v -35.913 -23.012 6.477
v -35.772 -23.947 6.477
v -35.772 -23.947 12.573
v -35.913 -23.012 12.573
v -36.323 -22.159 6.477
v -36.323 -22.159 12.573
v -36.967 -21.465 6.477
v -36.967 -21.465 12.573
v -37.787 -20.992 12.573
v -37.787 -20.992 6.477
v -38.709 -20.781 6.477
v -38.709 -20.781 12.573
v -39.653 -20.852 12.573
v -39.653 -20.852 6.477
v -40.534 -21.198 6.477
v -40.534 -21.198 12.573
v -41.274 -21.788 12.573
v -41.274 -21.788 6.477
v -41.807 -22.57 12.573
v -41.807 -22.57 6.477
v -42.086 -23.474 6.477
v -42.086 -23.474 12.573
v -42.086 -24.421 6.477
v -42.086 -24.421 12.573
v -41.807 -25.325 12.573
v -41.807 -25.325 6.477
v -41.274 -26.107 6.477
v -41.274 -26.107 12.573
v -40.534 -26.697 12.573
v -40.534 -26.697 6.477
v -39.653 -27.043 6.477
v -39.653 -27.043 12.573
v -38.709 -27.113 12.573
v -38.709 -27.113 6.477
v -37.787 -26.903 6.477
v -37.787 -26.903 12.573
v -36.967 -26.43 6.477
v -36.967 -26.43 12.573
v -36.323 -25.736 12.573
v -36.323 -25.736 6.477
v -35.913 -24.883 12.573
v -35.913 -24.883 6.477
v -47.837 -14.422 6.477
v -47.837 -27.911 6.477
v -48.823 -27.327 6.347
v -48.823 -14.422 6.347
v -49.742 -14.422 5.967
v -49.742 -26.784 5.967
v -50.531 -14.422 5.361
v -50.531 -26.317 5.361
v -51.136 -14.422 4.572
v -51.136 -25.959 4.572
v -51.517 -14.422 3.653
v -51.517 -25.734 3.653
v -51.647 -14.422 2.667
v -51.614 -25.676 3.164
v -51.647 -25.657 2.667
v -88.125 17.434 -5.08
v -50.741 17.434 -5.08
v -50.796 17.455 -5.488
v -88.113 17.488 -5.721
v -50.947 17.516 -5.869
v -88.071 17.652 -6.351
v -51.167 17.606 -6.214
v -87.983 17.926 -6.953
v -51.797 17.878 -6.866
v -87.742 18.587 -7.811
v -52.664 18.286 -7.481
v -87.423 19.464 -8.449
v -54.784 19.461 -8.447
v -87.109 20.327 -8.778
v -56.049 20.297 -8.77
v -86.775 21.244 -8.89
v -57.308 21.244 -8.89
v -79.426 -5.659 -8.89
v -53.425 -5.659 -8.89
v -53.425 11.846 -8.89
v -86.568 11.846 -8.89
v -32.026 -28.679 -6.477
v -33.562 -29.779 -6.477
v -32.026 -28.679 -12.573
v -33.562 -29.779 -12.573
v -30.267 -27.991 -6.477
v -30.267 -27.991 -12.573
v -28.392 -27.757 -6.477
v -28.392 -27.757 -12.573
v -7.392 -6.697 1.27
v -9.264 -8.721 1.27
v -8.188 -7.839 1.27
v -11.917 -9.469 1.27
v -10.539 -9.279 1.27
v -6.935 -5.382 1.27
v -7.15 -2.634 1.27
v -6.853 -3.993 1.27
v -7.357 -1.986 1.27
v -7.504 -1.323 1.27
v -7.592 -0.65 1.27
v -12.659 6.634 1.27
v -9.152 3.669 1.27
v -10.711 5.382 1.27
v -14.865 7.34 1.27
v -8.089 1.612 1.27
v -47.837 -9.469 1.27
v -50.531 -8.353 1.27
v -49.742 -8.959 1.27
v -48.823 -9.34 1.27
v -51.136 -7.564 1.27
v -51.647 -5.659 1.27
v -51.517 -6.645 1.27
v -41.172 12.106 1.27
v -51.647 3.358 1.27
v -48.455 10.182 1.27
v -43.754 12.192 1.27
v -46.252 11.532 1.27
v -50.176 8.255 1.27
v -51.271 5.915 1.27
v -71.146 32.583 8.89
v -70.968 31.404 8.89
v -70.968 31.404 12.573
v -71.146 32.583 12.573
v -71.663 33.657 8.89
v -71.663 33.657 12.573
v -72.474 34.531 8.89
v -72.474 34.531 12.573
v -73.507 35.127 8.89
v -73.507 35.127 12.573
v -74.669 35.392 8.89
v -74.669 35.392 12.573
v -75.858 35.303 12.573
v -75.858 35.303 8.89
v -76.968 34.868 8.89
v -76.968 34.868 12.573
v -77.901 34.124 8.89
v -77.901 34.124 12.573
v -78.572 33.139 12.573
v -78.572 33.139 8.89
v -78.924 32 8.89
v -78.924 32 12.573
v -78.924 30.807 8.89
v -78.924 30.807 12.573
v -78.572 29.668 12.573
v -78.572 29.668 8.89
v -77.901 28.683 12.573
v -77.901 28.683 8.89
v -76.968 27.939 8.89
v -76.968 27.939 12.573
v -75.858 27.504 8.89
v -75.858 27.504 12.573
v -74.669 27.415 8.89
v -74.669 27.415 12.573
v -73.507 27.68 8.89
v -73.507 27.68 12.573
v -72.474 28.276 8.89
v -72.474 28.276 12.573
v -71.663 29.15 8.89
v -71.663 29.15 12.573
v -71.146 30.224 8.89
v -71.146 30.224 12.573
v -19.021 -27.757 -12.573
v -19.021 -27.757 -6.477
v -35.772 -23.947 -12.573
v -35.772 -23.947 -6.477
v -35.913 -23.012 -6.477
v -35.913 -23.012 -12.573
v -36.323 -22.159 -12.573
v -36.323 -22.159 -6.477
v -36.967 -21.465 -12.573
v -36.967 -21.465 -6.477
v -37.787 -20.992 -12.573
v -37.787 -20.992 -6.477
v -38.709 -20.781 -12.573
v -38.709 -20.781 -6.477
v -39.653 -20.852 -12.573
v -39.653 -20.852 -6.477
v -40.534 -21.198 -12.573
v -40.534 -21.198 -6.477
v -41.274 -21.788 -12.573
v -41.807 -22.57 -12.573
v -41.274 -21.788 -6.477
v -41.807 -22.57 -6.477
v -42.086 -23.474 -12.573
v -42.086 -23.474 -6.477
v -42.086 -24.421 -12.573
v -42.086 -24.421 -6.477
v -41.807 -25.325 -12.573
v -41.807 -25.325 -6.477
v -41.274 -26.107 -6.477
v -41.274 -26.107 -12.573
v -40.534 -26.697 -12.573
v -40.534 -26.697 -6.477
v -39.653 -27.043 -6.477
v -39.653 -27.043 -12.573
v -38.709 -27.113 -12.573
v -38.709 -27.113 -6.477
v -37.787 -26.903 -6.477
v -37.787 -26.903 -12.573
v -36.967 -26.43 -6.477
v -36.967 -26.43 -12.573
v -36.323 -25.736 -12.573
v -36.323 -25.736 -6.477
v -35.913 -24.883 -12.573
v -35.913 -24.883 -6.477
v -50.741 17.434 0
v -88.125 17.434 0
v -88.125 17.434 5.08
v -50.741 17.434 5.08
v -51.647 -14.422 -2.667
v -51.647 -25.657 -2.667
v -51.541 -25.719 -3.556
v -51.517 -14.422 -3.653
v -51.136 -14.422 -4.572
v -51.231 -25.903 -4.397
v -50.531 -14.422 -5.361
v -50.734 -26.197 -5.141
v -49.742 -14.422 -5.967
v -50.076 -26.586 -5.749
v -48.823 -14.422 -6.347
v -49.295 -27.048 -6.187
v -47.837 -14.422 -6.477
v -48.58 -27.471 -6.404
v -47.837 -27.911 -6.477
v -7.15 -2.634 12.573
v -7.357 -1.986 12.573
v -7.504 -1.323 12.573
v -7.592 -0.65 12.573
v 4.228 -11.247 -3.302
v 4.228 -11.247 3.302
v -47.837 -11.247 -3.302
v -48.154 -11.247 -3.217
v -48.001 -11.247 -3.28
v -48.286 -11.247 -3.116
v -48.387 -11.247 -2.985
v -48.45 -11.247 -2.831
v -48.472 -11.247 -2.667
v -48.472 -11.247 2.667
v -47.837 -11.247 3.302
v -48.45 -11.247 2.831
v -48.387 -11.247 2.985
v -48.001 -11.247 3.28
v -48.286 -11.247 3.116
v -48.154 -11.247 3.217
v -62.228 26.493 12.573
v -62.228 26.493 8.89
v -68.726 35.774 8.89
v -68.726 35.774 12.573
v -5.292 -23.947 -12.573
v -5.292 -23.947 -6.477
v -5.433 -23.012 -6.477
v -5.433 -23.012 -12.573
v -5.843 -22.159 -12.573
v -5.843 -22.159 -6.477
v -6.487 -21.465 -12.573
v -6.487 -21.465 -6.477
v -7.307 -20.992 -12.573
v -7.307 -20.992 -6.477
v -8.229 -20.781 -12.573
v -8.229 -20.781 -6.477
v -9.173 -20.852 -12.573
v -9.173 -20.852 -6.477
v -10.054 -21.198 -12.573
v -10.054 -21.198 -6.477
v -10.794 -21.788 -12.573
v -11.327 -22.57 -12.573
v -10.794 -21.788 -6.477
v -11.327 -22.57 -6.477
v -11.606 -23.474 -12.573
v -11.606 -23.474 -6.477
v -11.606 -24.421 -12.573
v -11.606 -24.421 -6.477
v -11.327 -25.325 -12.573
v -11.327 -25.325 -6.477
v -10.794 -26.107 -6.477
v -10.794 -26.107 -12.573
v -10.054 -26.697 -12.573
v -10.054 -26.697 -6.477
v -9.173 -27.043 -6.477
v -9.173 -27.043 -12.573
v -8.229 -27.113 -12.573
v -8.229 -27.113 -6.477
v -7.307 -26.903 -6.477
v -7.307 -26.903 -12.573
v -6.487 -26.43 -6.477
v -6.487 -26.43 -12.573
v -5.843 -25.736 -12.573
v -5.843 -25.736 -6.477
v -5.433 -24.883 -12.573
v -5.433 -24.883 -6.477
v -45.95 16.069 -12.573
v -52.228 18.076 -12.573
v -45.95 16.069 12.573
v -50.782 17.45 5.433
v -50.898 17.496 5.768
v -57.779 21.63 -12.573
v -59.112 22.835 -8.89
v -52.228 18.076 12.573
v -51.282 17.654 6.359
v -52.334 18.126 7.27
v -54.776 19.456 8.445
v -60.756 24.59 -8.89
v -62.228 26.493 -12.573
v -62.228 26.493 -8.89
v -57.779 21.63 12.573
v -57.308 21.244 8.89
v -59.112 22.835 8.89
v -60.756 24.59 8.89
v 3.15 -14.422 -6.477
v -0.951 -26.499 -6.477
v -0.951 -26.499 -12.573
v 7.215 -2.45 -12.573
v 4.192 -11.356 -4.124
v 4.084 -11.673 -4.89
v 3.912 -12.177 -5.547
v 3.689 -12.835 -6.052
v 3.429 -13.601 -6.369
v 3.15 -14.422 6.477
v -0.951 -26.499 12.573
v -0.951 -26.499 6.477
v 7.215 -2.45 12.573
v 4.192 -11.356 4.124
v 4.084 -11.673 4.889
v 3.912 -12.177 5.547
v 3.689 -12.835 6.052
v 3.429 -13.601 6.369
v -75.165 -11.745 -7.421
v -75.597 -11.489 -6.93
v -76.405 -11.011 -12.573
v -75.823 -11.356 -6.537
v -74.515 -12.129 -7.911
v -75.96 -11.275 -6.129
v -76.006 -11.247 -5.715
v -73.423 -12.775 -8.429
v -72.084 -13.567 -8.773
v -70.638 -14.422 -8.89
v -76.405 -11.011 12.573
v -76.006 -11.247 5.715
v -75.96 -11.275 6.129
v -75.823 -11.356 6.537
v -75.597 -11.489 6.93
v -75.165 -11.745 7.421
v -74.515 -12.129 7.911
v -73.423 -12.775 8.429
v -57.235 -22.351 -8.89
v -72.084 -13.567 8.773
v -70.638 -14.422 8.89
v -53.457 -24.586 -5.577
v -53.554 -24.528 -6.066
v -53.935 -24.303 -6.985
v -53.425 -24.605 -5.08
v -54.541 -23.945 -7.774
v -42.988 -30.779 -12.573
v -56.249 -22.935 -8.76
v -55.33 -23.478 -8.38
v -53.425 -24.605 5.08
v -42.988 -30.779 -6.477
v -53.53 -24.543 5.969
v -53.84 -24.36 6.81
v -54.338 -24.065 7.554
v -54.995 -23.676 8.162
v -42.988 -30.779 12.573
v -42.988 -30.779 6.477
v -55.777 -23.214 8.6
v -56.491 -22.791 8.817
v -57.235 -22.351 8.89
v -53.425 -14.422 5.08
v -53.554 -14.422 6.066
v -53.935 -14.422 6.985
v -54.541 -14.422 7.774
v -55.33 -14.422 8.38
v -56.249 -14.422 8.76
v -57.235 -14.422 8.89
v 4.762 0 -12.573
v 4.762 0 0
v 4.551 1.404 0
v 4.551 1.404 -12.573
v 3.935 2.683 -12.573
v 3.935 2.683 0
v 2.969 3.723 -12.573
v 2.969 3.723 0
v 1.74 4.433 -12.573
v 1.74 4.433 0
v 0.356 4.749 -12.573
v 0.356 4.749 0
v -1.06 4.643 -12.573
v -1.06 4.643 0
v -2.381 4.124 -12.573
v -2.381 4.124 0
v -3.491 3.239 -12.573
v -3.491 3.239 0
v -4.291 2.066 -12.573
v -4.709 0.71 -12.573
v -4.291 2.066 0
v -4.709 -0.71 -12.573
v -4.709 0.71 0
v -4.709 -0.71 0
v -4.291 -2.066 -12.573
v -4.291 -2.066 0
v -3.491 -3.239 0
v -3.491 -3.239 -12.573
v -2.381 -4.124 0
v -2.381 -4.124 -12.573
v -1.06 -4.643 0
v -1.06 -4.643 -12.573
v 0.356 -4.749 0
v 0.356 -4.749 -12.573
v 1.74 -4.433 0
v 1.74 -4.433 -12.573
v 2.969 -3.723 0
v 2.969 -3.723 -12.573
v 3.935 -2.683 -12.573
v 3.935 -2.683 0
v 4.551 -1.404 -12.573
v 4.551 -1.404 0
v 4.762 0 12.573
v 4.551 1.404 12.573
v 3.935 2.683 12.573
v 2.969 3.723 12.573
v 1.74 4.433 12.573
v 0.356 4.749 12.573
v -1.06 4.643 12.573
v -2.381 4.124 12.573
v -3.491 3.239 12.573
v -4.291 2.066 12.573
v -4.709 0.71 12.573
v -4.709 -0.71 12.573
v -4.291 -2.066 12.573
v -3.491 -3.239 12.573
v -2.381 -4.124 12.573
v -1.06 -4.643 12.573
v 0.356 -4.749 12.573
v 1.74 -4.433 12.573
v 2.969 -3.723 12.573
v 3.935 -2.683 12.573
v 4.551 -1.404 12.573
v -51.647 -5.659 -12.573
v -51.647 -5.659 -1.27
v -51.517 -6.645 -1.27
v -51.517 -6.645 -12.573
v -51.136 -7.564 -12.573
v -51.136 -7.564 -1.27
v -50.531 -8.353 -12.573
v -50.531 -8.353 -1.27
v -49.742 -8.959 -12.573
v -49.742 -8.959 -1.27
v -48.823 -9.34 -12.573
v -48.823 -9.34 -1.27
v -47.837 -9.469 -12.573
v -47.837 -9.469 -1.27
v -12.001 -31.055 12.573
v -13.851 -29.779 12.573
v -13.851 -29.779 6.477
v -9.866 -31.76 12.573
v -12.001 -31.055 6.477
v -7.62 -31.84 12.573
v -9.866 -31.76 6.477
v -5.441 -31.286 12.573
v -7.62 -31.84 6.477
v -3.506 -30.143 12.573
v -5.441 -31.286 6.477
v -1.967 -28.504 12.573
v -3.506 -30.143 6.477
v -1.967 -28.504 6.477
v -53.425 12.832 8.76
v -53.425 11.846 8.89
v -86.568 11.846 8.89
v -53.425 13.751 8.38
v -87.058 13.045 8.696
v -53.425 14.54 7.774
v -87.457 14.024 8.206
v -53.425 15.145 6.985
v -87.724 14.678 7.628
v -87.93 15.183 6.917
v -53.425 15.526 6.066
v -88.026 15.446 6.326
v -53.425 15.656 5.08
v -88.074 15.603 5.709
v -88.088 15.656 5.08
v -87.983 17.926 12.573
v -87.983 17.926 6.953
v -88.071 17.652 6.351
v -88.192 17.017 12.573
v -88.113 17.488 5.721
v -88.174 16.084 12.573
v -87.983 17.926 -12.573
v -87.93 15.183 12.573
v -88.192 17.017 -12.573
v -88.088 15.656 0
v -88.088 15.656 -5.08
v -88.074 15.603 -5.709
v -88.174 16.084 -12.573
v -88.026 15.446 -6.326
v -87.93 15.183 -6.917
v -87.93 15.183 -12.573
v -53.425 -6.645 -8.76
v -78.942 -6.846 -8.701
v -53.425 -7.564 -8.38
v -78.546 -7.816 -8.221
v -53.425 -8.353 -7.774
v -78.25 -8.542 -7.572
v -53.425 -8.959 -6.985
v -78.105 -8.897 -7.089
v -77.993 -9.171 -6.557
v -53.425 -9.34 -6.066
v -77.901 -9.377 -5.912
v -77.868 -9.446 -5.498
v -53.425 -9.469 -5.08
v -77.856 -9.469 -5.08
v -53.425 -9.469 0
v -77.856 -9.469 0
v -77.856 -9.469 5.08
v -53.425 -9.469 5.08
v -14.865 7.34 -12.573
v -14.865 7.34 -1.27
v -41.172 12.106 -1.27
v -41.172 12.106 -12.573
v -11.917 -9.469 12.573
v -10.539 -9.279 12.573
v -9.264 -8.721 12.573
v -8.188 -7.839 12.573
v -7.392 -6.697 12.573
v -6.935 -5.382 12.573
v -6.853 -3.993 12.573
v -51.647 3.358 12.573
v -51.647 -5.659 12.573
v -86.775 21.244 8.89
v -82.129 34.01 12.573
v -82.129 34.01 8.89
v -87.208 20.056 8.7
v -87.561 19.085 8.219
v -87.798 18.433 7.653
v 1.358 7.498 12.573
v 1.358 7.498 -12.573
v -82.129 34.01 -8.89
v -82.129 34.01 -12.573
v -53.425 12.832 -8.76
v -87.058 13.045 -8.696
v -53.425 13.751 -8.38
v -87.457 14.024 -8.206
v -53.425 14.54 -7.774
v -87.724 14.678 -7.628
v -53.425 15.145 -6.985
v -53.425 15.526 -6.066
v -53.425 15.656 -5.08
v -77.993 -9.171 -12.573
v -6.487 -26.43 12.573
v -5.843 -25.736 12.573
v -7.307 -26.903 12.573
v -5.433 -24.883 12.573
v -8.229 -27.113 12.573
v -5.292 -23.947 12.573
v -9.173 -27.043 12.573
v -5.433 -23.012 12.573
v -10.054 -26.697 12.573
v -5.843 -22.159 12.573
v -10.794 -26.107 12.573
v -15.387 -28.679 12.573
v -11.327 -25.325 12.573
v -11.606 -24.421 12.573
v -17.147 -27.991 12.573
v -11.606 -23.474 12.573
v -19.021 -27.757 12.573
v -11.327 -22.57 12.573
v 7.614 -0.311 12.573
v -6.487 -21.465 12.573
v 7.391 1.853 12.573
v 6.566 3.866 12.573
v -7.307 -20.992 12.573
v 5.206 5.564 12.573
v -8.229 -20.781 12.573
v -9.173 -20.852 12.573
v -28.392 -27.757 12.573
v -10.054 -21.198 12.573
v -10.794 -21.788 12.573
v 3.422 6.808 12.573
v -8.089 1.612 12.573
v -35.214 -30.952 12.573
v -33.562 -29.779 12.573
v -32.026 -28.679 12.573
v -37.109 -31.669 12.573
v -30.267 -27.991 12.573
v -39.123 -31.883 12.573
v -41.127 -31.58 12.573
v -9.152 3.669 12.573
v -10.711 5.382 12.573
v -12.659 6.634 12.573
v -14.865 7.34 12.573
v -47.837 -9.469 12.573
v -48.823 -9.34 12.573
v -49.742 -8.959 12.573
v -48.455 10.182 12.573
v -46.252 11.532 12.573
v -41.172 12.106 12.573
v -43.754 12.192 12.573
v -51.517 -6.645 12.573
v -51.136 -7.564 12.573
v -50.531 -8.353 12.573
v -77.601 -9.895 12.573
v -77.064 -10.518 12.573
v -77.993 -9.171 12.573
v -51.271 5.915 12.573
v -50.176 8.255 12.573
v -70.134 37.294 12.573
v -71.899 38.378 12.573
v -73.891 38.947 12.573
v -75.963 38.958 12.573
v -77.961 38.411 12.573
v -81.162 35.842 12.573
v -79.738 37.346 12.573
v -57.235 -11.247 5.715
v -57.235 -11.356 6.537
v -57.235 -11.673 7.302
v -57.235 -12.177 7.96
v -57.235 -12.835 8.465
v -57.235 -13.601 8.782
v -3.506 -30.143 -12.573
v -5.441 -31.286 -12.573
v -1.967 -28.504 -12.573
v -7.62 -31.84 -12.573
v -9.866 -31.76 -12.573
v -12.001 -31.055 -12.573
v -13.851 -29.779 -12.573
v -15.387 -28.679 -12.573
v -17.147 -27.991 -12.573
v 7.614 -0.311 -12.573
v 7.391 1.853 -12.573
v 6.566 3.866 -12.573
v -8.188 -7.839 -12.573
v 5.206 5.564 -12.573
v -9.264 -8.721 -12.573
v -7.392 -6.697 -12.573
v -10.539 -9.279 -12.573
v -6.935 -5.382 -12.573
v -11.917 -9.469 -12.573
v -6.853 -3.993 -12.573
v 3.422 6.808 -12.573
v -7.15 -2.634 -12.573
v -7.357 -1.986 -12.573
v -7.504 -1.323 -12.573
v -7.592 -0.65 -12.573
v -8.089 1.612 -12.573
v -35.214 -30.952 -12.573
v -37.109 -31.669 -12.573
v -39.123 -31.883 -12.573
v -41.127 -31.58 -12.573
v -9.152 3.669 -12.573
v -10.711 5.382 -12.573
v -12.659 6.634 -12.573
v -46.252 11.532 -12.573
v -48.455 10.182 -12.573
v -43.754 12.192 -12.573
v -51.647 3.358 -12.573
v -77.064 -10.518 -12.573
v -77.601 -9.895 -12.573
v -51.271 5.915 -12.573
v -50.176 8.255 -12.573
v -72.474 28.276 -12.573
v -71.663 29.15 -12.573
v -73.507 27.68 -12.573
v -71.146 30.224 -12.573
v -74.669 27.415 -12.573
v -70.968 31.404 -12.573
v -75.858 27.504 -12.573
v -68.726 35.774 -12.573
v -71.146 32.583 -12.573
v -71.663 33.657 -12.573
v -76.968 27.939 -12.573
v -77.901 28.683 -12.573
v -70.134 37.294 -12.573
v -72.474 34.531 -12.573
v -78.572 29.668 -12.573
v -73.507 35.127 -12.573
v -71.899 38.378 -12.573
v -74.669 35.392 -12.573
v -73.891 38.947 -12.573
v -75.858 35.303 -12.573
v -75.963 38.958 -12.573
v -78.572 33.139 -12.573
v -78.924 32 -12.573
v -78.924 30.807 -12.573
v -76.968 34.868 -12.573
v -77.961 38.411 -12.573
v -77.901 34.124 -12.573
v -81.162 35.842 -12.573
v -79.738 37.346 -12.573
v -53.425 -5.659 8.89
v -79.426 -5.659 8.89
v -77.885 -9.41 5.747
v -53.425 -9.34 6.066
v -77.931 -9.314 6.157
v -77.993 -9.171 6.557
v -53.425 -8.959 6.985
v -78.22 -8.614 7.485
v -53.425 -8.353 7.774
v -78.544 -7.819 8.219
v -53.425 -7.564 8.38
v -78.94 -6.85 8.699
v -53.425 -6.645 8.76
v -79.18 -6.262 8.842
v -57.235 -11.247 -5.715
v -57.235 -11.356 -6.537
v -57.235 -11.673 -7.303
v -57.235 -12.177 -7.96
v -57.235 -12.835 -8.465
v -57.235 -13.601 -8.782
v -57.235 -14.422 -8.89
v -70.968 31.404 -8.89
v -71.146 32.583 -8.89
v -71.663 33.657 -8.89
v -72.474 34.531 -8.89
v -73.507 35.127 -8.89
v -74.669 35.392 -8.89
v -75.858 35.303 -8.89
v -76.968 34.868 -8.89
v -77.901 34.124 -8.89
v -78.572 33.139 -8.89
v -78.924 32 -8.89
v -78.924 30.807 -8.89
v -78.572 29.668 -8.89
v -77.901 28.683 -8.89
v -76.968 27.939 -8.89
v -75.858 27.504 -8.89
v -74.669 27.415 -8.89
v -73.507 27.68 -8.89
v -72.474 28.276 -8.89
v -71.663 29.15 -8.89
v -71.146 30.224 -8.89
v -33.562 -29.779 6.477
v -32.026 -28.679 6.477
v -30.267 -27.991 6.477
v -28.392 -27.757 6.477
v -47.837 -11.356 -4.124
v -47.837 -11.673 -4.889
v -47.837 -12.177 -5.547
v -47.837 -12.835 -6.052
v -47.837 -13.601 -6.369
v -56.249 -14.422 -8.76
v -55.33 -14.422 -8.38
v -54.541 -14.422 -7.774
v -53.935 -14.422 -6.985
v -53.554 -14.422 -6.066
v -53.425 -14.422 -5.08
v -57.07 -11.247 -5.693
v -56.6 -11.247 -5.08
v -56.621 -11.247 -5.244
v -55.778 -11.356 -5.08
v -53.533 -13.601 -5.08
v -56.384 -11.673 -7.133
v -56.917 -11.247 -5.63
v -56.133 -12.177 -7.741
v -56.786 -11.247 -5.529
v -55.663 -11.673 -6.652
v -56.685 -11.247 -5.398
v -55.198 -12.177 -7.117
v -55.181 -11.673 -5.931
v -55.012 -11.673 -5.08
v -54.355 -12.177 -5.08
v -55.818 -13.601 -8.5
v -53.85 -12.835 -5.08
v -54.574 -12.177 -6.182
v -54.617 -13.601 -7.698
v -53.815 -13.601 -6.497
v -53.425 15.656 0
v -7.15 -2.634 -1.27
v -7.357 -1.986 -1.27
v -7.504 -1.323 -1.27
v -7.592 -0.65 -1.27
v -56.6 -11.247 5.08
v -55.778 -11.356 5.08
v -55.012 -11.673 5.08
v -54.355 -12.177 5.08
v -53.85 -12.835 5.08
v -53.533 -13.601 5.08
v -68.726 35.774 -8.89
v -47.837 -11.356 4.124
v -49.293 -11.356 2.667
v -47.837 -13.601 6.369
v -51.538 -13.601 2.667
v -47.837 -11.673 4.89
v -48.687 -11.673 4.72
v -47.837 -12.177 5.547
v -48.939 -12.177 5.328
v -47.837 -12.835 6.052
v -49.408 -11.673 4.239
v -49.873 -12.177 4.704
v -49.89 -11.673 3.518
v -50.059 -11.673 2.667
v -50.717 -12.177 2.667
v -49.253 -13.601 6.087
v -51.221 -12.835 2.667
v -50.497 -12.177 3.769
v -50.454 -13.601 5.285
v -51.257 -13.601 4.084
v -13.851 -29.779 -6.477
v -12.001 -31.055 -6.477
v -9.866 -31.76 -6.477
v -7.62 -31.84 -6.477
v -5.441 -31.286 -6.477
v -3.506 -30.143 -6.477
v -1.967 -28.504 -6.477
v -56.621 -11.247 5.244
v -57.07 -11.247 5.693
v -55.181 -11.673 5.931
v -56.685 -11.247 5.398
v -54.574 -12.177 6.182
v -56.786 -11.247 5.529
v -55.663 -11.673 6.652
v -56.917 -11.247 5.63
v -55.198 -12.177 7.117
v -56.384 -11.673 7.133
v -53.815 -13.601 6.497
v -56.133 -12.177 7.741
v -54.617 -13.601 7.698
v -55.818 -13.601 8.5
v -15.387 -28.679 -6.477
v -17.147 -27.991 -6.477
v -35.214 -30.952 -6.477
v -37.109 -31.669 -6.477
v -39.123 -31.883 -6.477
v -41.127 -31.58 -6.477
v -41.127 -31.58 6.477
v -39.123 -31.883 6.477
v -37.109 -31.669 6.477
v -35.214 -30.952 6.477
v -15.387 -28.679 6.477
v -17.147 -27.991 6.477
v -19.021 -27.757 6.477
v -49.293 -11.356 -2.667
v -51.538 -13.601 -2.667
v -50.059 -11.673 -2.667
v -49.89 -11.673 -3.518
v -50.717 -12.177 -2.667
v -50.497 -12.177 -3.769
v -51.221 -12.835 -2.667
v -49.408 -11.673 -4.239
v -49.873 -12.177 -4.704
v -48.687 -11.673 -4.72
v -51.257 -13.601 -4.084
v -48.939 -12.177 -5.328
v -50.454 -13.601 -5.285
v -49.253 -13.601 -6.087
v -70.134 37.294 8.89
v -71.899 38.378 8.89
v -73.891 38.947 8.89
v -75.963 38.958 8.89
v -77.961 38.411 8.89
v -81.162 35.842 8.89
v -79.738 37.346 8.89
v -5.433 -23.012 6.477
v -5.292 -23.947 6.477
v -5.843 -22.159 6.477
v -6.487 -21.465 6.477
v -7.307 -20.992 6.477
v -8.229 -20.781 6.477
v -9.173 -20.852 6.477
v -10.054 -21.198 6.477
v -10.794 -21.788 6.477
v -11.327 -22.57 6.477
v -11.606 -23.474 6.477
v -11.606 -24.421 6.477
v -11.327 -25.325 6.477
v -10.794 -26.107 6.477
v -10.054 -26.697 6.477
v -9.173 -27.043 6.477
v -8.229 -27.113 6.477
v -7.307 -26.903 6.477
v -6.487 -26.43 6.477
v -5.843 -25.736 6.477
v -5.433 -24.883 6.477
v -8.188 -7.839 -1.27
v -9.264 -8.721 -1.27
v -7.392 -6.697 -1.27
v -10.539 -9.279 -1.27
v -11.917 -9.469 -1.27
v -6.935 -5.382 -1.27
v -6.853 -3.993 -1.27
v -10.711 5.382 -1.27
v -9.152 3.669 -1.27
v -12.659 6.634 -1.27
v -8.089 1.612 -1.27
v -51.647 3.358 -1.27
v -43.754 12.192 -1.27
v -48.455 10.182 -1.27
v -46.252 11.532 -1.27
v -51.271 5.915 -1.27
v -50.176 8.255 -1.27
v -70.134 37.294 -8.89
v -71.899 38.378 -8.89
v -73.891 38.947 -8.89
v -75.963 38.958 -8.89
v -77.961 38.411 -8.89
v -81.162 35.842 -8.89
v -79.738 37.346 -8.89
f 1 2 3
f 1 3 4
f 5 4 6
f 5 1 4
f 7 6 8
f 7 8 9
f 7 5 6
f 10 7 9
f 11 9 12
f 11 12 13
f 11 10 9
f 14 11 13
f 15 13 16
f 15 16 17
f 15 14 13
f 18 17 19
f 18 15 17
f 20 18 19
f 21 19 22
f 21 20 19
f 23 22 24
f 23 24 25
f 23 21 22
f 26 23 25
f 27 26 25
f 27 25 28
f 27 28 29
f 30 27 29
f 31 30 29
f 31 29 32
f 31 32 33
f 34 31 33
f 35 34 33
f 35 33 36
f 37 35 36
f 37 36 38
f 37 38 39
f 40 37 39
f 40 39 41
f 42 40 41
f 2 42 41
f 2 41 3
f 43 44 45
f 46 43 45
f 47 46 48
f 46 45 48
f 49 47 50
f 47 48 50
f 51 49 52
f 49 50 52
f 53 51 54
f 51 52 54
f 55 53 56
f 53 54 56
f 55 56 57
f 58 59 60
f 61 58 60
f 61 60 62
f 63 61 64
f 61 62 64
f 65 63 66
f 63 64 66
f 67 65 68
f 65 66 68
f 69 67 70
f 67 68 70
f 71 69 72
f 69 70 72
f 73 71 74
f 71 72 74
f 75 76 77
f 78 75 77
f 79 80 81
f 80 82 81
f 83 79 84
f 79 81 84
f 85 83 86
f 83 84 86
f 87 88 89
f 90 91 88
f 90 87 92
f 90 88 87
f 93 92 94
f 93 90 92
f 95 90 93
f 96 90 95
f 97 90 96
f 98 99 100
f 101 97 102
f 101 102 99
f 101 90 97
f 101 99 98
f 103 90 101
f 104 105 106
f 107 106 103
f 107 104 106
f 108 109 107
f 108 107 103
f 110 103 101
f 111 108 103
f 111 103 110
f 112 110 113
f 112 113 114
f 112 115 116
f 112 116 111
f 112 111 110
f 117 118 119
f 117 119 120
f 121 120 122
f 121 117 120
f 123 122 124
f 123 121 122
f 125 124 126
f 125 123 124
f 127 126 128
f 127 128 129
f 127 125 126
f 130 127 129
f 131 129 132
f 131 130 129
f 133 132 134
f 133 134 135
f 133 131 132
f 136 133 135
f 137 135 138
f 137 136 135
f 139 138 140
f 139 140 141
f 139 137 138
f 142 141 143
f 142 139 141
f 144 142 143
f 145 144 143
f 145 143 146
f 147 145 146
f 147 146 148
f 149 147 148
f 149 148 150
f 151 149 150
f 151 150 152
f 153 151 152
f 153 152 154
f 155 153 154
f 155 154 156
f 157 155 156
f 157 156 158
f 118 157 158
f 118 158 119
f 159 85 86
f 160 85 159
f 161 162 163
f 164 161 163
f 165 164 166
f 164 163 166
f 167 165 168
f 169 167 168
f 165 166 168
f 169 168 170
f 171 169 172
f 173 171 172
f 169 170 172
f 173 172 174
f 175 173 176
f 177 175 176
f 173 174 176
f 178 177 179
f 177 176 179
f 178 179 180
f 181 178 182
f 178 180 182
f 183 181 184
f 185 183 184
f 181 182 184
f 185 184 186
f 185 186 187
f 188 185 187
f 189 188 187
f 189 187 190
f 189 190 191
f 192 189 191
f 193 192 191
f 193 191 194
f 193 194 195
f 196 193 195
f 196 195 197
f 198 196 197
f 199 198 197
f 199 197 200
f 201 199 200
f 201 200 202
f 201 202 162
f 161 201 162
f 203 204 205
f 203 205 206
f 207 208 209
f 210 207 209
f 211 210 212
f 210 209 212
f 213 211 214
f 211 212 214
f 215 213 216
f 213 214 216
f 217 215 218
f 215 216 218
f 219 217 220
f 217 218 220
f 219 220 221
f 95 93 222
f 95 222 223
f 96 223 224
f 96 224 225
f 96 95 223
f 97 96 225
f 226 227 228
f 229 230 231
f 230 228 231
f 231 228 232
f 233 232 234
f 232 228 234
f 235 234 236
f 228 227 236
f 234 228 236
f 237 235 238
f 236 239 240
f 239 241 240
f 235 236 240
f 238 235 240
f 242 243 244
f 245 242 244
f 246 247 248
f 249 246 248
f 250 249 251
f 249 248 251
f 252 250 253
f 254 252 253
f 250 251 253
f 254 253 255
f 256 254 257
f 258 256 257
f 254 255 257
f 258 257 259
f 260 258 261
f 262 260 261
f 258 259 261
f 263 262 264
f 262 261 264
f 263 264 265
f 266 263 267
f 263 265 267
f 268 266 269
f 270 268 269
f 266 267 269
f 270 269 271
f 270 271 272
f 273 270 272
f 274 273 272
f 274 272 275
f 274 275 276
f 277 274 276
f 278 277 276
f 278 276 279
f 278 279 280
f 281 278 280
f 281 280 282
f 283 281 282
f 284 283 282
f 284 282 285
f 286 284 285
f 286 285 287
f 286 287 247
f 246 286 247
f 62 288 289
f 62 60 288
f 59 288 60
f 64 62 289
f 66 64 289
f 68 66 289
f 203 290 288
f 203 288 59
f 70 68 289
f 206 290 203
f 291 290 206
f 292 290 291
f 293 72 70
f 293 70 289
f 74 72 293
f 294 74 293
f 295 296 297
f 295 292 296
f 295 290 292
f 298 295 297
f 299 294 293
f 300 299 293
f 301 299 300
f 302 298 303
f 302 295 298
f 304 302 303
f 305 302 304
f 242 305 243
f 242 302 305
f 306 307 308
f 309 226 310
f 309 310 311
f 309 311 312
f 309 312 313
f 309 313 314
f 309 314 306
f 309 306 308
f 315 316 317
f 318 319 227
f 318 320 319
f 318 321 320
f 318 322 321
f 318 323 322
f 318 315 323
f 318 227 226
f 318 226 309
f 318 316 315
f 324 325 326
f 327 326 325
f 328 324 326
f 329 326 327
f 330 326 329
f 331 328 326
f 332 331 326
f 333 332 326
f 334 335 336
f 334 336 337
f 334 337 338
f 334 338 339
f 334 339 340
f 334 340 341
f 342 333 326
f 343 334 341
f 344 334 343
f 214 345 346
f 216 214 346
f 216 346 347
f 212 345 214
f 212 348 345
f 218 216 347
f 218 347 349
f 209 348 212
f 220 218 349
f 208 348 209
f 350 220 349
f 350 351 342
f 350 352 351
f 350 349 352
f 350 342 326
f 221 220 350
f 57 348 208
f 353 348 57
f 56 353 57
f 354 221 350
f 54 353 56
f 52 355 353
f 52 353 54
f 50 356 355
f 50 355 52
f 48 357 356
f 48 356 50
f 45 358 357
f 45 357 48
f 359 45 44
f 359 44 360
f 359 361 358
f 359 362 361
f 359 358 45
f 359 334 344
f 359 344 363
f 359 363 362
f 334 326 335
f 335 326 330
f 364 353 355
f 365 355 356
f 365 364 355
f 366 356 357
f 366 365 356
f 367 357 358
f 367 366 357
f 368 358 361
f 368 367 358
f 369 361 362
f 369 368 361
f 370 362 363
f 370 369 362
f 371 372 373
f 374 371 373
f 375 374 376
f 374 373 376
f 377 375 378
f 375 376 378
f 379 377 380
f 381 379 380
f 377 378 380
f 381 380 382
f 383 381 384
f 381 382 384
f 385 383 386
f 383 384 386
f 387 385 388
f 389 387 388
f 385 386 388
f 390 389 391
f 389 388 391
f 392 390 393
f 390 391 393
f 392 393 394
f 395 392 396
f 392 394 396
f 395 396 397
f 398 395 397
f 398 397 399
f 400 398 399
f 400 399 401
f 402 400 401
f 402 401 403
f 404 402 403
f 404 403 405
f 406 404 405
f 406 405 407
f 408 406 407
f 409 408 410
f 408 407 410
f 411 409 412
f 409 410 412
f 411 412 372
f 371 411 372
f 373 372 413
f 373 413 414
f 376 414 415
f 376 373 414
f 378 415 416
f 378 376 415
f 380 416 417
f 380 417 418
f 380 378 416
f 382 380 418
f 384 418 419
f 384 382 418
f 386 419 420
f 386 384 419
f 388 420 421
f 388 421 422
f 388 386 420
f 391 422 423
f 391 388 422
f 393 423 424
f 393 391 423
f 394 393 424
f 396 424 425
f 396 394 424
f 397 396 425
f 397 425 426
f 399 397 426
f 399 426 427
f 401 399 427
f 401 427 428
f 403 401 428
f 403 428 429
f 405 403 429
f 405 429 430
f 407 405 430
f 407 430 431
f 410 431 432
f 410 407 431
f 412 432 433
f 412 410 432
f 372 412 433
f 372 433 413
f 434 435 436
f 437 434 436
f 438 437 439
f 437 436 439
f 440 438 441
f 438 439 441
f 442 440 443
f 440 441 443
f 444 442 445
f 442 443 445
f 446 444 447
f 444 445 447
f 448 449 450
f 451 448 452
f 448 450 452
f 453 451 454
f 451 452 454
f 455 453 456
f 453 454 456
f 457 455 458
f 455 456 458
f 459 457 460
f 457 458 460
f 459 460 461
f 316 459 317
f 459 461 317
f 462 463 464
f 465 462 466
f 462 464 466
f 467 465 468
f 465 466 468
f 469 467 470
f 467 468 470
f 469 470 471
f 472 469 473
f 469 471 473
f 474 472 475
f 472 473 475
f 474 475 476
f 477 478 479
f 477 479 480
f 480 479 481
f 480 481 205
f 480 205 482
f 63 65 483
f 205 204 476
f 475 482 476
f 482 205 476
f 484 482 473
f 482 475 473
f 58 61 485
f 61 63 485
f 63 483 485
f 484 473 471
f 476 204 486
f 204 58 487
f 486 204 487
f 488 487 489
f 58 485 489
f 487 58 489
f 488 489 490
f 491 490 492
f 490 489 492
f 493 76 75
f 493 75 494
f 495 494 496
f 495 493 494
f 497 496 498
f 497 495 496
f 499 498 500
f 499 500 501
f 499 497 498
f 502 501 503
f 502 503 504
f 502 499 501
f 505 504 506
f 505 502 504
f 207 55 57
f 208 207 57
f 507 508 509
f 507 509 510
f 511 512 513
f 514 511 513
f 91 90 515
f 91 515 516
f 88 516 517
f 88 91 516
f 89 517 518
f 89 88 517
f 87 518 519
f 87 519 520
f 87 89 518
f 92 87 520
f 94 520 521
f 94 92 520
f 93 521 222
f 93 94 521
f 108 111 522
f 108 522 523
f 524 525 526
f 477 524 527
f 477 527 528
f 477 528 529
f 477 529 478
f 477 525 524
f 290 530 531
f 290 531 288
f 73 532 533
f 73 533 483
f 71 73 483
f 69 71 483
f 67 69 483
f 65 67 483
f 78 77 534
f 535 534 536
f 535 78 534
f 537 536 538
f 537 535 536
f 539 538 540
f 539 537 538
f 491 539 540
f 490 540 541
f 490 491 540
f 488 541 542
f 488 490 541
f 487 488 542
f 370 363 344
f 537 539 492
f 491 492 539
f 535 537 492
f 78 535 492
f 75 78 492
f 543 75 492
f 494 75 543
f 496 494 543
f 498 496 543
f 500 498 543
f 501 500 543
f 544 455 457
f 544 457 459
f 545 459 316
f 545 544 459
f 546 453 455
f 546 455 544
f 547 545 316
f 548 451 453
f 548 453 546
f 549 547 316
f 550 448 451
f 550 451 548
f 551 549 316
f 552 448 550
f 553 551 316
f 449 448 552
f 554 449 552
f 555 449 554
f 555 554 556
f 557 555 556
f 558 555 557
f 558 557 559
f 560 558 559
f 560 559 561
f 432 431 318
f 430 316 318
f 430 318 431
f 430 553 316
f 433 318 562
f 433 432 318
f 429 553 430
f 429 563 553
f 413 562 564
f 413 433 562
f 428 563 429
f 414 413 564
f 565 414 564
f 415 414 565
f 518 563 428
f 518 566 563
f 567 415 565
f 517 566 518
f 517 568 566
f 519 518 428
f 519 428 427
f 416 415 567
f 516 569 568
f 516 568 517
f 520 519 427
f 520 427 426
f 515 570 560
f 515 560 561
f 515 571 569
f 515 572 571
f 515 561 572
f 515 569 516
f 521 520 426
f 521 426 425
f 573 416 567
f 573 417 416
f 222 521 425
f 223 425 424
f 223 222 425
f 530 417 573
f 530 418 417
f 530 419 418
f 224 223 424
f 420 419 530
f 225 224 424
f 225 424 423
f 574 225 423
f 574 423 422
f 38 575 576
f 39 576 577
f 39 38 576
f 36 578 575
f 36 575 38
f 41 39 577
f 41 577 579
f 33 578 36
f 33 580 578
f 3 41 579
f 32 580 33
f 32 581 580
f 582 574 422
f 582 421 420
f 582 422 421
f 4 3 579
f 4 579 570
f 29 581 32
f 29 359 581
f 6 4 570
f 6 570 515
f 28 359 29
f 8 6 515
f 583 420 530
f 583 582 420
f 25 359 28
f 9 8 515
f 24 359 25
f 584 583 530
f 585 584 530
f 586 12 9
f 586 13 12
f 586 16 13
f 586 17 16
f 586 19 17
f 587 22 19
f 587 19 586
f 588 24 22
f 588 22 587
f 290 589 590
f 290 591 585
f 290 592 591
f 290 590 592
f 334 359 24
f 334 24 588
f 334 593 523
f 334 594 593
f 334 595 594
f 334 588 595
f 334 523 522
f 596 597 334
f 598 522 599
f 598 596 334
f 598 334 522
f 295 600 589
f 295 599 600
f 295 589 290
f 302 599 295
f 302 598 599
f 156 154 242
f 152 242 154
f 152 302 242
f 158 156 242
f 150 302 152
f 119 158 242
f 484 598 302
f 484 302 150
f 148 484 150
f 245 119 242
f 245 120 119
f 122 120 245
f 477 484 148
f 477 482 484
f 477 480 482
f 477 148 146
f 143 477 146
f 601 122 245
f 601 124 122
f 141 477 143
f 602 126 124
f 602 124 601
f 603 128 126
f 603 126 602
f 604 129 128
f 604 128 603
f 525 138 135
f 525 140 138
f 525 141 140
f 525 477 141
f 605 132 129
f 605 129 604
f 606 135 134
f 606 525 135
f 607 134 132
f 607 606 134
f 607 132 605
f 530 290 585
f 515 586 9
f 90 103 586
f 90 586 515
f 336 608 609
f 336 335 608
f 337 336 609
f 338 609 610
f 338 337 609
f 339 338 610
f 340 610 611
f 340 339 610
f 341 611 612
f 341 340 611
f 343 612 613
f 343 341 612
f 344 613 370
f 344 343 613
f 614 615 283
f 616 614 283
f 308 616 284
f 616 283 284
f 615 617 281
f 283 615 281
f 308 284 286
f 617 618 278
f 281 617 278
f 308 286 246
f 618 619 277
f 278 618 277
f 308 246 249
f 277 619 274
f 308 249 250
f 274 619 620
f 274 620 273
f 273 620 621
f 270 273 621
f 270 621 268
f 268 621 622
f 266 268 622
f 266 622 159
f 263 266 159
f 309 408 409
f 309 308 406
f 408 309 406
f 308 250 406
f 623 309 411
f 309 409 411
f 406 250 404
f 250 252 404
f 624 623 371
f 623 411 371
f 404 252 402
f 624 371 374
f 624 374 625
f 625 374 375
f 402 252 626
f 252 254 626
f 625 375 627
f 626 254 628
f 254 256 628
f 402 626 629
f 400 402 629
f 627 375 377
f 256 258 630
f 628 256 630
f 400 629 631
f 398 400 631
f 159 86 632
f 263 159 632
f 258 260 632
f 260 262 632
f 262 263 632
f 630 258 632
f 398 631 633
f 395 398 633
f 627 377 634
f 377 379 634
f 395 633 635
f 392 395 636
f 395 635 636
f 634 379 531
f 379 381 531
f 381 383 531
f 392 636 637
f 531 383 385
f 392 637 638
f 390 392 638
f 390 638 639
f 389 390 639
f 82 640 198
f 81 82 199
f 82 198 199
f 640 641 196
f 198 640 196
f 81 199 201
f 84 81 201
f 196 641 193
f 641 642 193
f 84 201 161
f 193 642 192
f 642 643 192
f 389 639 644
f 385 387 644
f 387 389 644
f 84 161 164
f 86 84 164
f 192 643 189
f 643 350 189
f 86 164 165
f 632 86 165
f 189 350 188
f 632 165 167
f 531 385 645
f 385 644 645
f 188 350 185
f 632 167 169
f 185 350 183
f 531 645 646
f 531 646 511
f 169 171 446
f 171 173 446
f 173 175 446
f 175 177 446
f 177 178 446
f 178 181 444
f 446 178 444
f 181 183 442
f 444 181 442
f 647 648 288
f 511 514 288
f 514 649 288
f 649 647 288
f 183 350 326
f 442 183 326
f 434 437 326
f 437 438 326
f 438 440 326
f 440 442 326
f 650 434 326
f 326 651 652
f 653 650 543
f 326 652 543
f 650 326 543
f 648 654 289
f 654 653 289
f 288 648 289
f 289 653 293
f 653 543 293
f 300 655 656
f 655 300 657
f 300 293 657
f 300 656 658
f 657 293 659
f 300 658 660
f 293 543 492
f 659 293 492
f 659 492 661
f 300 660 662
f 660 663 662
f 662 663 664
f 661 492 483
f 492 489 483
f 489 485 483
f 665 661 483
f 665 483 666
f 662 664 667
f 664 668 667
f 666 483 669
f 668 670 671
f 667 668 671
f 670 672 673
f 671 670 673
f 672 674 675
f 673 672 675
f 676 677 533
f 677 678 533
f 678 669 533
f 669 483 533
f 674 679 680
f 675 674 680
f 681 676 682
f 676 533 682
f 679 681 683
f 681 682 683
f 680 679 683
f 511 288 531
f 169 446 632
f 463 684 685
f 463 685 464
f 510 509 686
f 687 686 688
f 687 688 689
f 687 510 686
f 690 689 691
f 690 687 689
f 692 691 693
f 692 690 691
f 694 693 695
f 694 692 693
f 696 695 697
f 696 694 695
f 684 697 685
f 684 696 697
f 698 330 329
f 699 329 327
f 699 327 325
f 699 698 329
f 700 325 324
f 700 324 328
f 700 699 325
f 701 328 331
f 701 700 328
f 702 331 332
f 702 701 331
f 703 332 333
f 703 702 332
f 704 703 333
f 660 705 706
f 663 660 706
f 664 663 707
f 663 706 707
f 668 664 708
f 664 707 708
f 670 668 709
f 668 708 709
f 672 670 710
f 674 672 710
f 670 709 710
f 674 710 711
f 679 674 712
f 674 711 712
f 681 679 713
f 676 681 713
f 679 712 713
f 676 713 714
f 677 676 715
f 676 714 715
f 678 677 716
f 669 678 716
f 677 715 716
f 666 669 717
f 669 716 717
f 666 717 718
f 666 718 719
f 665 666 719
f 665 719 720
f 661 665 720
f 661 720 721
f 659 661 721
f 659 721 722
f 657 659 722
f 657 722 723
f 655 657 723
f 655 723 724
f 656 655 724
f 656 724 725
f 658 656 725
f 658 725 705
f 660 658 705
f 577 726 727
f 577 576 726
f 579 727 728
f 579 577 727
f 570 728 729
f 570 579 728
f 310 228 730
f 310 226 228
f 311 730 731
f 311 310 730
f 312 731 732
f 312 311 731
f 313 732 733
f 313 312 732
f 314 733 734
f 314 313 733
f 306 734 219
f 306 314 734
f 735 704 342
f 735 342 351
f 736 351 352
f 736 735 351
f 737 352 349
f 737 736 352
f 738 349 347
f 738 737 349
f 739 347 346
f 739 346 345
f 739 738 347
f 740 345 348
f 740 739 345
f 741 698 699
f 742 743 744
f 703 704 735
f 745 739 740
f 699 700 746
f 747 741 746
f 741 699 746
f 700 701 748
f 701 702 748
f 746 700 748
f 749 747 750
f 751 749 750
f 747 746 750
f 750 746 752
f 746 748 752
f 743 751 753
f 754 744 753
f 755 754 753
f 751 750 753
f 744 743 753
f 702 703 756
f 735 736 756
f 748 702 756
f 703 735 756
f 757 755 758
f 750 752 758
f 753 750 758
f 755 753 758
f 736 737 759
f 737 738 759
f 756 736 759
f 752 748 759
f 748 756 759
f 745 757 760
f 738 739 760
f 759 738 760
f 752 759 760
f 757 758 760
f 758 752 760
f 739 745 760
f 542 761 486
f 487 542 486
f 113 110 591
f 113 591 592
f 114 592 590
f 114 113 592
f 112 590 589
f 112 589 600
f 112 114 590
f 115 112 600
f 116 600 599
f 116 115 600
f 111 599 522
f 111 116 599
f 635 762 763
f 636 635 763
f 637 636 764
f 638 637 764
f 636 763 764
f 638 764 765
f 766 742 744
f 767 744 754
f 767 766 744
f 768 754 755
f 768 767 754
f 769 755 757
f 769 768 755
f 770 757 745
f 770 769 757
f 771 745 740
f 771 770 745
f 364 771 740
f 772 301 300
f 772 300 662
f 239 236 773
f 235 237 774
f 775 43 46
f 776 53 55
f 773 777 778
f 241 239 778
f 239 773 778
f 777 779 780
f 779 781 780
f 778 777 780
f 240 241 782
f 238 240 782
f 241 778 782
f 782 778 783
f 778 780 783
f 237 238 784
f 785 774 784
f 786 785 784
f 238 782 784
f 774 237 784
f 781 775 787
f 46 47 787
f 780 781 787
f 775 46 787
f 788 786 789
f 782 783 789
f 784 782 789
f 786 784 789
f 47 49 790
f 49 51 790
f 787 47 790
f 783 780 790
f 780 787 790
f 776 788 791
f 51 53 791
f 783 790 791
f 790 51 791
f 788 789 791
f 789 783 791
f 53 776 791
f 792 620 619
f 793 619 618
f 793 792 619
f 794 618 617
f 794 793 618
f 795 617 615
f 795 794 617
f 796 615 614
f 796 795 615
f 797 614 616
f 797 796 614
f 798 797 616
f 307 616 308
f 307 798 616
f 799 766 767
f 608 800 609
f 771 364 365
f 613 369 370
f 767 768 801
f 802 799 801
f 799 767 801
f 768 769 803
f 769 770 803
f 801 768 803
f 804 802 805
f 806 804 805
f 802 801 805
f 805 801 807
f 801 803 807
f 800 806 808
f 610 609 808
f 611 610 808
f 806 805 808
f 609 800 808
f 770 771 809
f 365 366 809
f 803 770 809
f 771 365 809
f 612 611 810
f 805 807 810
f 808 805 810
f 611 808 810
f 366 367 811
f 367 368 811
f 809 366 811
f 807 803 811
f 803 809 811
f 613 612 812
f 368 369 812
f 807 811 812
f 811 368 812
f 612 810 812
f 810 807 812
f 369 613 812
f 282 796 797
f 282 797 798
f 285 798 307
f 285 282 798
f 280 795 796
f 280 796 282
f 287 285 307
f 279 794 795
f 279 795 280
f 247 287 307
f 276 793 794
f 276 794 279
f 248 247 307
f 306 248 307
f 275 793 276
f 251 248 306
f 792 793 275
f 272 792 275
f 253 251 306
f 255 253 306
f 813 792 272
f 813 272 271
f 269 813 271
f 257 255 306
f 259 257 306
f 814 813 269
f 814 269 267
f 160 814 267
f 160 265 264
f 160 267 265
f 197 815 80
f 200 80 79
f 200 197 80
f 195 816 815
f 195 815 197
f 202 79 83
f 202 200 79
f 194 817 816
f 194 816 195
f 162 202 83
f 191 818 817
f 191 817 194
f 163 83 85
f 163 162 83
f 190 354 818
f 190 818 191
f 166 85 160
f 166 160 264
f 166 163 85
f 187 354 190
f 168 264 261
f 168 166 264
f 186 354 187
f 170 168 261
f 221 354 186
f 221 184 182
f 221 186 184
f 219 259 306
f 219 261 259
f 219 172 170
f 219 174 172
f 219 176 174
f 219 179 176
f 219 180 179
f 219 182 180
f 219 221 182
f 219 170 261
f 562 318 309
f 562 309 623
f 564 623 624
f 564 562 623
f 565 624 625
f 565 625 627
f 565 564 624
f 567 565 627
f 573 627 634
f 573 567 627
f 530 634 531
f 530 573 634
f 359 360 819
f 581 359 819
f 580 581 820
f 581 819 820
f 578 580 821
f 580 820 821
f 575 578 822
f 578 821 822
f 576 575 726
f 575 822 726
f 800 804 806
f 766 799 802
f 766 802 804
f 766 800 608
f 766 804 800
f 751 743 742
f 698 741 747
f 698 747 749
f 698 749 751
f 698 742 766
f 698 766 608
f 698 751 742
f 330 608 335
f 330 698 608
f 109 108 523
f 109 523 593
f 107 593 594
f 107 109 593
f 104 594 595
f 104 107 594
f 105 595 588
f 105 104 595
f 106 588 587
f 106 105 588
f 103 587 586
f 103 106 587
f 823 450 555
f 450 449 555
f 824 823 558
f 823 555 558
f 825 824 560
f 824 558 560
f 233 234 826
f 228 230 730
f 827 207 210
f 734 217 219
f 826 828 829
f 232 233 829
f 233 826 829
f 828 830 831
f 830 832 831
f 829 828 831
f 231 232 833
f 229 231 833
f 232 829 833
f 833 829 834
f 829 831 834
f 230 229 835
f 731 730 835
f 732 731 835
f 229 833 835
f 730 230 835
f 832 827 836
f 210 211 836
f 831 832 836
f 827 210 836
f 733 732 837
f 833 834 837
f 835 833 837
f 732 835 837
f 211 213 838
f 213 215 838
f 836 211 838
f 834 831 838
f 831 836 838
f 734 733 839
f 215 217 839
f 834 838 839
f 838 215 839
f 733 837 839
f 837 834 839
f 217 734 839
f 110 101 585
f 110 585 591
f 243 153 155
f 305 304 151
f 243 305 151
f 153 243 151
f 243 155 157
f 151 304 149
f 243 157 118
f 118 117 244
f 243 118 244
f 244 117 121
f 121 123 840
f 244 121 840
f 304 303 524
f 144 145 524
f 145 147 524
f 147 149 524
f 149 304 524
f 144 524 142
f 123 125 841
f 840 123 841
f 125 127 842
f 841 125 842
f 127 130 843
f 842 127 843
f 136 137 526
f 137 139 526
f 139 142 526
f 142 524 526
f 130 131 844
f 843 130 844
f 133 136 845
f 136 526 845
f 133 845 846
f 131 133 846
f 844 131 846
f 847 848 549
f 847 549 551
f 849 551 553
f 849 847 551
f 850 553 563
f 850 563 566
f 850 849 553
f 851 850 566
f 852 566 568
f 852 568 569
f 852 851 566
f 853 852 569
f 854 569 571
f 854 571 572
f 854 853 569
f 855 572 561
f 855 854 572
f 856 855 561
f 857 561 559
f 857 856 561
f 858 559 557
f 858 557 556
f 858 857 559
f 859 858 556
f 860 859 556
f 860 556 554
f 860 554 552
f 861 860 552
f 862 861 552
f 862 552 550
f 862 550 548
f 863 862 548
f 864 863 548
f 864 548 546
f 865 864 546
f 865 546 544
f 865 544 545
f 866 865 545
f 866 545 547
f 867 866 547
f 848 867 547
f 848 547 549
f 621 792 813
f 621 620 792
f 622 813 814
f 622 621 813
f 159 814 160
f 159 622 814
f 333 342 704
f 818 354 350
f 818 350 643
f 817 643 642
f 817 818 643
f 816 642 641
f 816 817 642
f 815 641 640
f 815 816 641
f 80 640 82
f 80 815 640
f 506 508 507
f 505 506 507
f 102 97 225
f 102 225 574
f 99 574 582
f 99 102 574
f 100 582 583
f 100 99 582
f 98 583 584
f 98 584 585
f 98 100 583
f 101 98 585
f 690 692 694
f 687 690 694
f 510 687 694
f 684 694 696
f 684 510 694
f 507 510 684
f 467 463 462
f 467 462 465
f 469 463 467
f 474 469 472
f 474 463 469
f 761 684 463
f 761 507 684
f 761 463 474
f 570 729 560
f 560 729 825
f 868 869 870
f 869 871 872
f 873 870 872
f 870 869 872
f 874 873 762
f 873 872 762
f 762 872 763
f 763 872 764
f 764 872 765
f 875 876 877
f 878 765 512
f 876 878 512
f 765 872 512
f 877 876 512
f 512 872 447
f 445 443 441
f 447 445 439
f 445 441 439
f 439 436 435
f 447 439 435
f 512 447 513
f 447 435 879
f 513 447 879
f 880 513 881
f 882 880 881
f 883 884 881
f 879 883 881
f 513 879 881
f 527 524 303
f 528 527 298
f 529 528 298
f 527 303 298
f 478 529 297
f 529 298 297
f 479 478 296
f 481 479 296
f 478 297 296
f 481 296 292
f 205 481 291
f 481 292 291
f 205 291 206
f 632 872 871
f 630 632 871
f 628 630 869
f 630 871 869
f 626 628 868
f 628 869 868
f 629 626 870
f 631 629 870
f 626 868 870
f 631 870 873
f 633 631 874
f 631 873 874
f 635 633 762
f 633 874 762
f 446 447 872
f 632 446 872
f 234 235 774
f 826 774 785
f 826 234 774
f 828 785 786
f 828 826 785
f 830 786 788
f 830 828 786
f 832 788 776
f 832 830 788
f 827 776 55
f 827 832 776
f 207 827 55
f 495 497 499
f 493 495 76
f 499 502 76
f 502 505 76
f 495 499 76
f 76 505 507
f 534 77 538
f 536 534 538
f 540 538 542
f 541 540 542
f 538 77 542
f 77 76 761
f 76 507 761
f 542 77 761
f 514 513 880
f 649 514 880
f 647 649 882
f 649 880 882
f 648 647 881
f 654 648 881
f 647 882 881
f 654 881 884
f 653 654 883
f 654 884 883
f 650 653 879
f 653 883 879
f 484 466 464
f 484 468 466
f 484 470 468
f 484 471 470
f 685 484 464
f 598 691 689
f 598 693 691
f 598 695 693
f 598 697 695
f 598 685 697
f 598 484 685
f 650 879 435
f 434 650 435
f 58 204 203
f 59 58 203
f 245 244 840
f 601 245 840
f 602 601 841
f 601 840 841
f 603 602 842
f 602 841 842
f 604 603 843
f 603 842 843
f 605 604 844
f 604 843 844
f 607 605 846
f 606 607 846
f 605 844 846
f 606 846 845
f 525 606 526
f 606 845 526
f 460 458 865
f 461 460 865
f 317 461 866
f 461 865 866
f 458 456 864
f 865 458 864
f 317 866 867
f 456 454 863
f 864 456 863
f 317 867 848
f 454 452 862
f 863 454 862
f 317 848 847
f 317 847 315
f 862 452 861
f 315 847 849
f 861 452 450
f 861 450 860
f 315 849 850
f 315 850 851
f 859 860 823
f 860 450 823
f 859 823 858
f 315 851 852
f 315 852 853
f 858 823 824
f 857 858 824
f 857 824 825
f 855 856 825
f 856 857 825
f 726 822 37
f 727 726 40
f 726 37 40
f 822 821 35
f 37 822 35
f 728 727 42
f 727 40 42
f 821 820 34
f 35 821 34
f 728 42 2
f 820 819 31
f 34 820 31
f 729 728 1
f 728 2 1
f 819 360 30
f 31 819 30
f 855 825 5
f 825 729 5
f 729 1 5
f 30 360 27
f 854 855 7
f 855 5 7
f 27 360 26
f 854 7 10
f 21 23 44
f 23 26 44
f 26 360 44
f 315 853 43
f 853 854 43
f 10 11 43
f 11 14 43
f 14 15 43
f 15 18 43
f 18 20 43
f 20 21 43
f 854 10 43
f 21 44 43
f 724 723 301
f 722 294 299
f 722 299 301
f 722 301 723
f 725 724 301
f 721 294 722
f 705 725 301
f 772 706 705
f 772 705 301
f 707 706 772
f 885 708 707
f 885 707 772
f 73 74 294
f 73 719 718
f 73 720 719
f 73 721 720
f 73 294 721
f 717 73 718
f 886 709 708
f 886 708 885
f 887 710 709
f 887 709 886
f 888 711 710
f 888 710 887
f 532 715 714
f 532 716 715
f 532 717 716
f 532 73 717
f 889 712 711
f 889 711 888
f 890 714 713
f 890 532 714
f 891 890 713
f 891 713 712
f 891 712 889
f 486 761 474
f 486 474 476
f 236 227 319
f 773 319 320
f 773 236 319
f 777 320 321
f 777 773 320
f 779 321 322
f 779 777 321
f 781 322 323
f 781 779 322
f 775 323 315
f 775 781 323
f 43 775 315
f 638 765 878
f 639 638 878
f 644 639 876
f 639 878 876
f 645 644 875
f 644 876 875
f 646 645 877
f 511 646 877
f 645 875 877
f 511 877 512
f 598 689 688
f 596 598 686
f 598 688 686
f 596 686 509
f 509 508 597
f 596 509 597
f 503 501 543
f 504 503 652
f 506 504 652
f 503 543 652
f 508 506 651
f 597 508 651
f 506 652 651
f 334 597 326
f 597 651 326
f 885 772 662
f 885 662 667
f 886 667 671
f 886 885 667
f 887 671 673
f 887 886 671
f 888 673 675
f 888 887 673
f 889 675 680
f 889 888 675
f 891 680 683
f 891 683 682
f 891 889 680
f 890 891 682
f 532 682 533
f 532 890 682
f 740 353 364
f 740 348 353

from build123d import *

# Parameters (mm, degrees)
SKETCH1_R           = 4.7625
SKETCH1_R_2         = 4
SKETCH1_R_3         = 3.175
BOSS_EXTRUDE1_DEPTH = 12.573
BOSS_EXTRUDE2_DEPTH = 1.27
SKETCH1_6_R         = 3.175
CUT_EXTRUDE1_DEPTH  = 6.477
SKETCH1_10_R        = 4
CUT_EXTRUDE3_DEPTH  = 8.89
FILLET1_R           = 3.81
FILLET3_R           = 3.81
FILLET4_R           = 3.175
FILLET5_R           = 7.62


with BuildPart() as part:
    # Sketch1 → Boss-Extrude1 (new body)
    with BuildSketch(Plane(origin=(0, 0, 0), x_dir=(0, 1, 0), z_dir=(0, 0, 1))):
        with BuildLine():
            Line((-26.499431941, 0.950631657), (-2.449998994, -7.215393609))
            ThreePointArc((-2.449998994, -7.215393609), (3.866048142, -6.56643524), (7.497932311, -1.358459074))
            Line((7.497932311, -1.358459074), (16.069122988, 45.94970705))
            ThreePointArc((16.069122988, 45.94970705), (19.672222889, 55.119231342), (26.493389209, 62.227972063))
            Line((26.493389209, 62.227972063), (35.774163974, 68.726440514))
            ThreePointArc((35.774163974, 68.726440514), (38.958321373, 75.962988676), (34.009705021, 82.128836862))
            Line((34.009705021, 82.128836862), (16.544511529, 88.485647429))
            Line((16.544511529, 88.485647429), (-10.358349656, 77.508379092))
            Line((-10.358349656, 77.508379092), (-30.779024566, 42.987968953))
            ThreePointArc((-30.779024566, 42.987968953), (-31.601546647, 36.844959103), (-27.757349656, 31.983348043))
            Line((-27.757349656, 31.983348043), (-27.757349656, 15.42998529))
            ThreePointArc((-27.757349656, 15.42998529), (-31.855063811, 7.779670964), (-26.499431941, 0.950631657))
        make_face()
        with Locations(Location((0, 0, 0), (0, 0, 270))):
            Circle(SKETCH1_R, mode=Mode.SUBTRACT)
        with Locations(Location((31.403511529, 74.968379092, 0), (0, 0, 270))):
            Circle(SKETCH1_R_2, mode=Mode.SUBTRACT)
        with Locations(Location((-23.947349656, 38.946666667, 0), (0, 0, 270))):
            Circle(SKETCH1_R_3, mode=Mode.SUBTRACT)
        with Locations(Location((-23.947349656, 8.466666667, 0), (0, 0, 270))):
            Circle(SKETCH1_R_3, mode=Mode.SUBTRACT)
        with BuildLine():
            Line((-9.469349656, 47.836666667), (-9.469349656, 11.917365883))
            ThreePointArc((-9.469349656, 11.917365883), (-7.295140555, 7.750499045), (-2.633609794, 7.15041953))
            ThreePointArc((-2.633609794, 7.15041953), (-1.656512431, 7.437766235), (-0.649822418, 7.592241489))
            ThreePointArc((-0.649822418, 7.592241489), (4.576435948, 9.875722251), (7.339639123, 14.86498764))
            Line((7.339639123, 14.86498764), (12.10584978, 41.171797748))
            ThreePointArc((12.10584978, 41.171797748), (10.181808987, 48.455026751), (3.358262084, 51.646666667))
            Line((3.358262084, 51.646666667), (-5.659349656, 51.646666667))
            ThreePointArc((-5.659349656, 51.646666667), (-8.353426493, 50.530743503), (-9.469349656, 47.836666667))
        make_face(mode=Mode.SUBTRACT)
    extrude(amount=BOSS_EXTRUDE1_DEPTH)

    # Sketch1<4> → Boss-Extrude2 (add)
    with BuildSketch(Plane(origin=(0, 0, 0), x_dir=(0, 1, 0), z_dir=(0, 0, 1))):
        with BuildLine():
            ThreePointArc((-5.659349656, 51.646666667), (-8.353426493, 50.530743503), (-9.469349656, 47.836666667))
            Line((-9.469349656, 47.836666667), (-9.469349656, 11.917365883))
            ThreePointArc((-9.469349656, 11.917365883), (-7.295140555, 7.750499045), (-2.633609794, 7.15041953))
            ThreePointArc((-2.633609794, 7.15041953), (-1.656512431, 7.437766235), (-0.649822418, 7.592241489))
            ThreePointArc((-0.649822418, 7.592241489), (4.576435948, 9.875722251), (7.339639123, 14.86498764))
            Line((7.339639123, 14.86498764), (12.10584978, 41.171797748))
            ThreePointArc((12.10584978, 41.171797748), (10.181808987, 48.455026751), (3.358262084, 51.646666667))
            Line((3.358262084, 51.646666667), (-5.659349656, 51.646666667))
        make_face()
    extrude(amount=BOSS_EXTRUDE2_DEPTH)

    # Sketch1<6> → Cut-Extrude1 (cut)
    with BuildSketch(Plane(origin=(0, 0, 0), x_dir=(0, 1, 0), z_dir=(0, 0, 1))):
        with BuildLine():
            ThreePointArc((-27.757349656, 15.42998529), (-31.855063811, 7.779670964), (-26.499431941, 0.950631657))
            Line((-26.499431941, 0.950631657), (-11.247349656, -4.228238446))
            Line((-11.247349656, -4.228238446), (-11.247349656, 51.646666667))
            Line((-11.247349656, 51.646666667), (-25.656940256, 51.646666667))
            Line((-25.656940256, 51.646666667), (-30.779024566, 42.987968953))
            ThreePointArc((-30.779024566, 42.987968953), (-31.601546647, 36.844959103), (-27.757349656, 31.983348043))
            Line((-27.757349656, 31.983348043), (-27.757349656, 15.42998529))
        make_face()
        with Locations(Location((-23.947349656, 8.466666667, 0), (0, 0, 270))):
            Circle(SKETCH1_6_R, mode=Mode.SUBTRACT)
        with Locations(Location((-23.947349656, 38.946666667, 0), (0, 0, 270))):
            Circle(SKETCH1_6_R, mode=Mode.SUBTRACT)
    extrude(amount=CUT_EXTRUDE1_DEPTH, mode=Mode.SUBTRACT)

    # Sketch1<10> → Cut-Extrude3 (cut)
    # profile 1 of 3: a face of its own
    with BuildSketch(Plane(origin=(0, 0, 0), x_dir=(0, 1, 0), z_dir=(0, 0, 1))):
        with BuildLine():
            Line((17.433511529, 88.162077891), (17.433511529, 50.740503147))
            ThreePointArc((17.433511529, 50.740503147), (21.118462359, 57.150658387), (26.493389209, 62.227972063))
            Line((26.493389209, 62.227972063), (35.774163974, 68.726440514))
            ThreePointArc((35.774163974, 68.726440514), (38.958321373, 75.962988676), (34.009705021, 82.128836862))
            Line((34.009705021, 82.128836862), (17.433511529, 88.162077891))
        make_face()
        with Locations(Location((31.403511529, 74.968379092, 0), (0, 0, 270))):
            Circle(SKETCH1_10_R, mode=Mode.SUBTRACT)
    # profile 2 of 3: a face of its own
    with BuildSketch(Plane(origin=(0, 0, 0), x_dir=(0, 1, 0), z_dir=(0, 0, 1))):
        Polygon((-11.247349656, 76.005556842), (-24.605157851, 53.424666667), (-11.247349656, 53.424666667), align=None)
    # profile 3 of 3: a face of its own
    with BuildSketch(Plane(origin=(0, 0, 0), x_dir=(0, 1, 0), z_dir=(0, 0, 1))):
        Polygon((15.655511529, 88.122905656), (-9.469349656, 77.871120864), (-9.469349656, 53.424666667), (15.655511529, 53.424666667), align=None)
    extrude(amount=CUT_EXTRUDE3_DEPTH, mode=Mode.SUBTRACT)

    # Mirror1: part across face


with BuildPart() as part_1:
    add(part.part)
    add(part.part.mirror(Plane(origin=(-30.744300958, 0.707665305, 0), x_dir=(1, 0, 0), z_dir=(0, 0, -1))))

    # Fillet1
    fillet1_edges = [part_1.edges().sort_by_distance(p)[0] for p in [
        (-69.451290519, 17.433511529, 8.89),
        (-51.646666667, -18.452144956, 6.477),
        (-51.646666667, -18.452144956, -6.477),
        (-53.424666667, -17.926253754, 8.89),
        (-53.424666667, -17.926253754, -8.89),
        (-70.773786162, 15.655511529, 8.89),
        (-65.647893765, -9.469349656, 8.89),
        (-65.647893765, -9.469349656, -8.89),
        (-70.773786162, 15.655511529, -8.89),
        (-69.451290519, 17.433511529, -8.89),
    ]]
    fillet(fillet1_edges, radius=FILLET1_R)

    # Fillet3
    # the kernel refuses this fillet: 3.81 mm, written as the material it takes off along each edge
    with BuildSketch(Plane(origin=(-77.508379092, -10.358349656, -15.77817458), x_dir=(-0.3777939966211631, 0.9258896781566412, 0), z_dir=(0, 0, 1))) as fillet3_piece_1:
        with BuildLine():
            CenterArc((FILLET3_R * 0.336501268256, -FILLET3_R), FILLET3_R, 90, 37.196303294)
            Line((-FILLET3_R * 0.268046453486, -FILLET3_R * 0.203431075087), (0, 0))
            Line((0, 0), (FILLET3_R * 0.336501268256, 0))
        make_face()
    extrude(amount=31.55634916, mode=Mode.SUBTRACT)
    with BuildSketch(Plane(origin=(-88.485647429, 16.544511529, -16.248115103), x_dir=(0.3420201433256622, 0.9396926207859108, 0), z_dir=(0, 0, 1))) as fillet3_piece_2:
        with BuildLine():
            CenterArc((FILLET3_R * 0.385838855973, -FILLET3_R), FILLET3_R, 90, 42.197104506)
            Line((-FILLET3_R * 0.285844295256, -FILLET3_R * 0.259161458646), (0, 0))
            Line((0, 0), (FILLET3_R * 0.385838855973, 0))
        make_face()
    extrude(amount=32.496230206, mode=Mode.SUBTRACT)

    # Fillet4
    fillet4_edges = [part_1.edges().sort_by_distance(p)[0] for p in [
        (-53.424666667, -11.247349656, 0),
        (-66.620111754, -11.247349656, -8.89),
        (-66.620111754, -11.247349656, 8.89),
        (-54.54058983, -11.247349656, -7.774076836),
        (-54.54058983, -11.247349656, 7.774076836),
        (-21.80421411, -11.247349656, 6.477),
        (-51.646666667, -11.247349656, 0),
        (-21.80421411, -11.247349656, -6.477),
        (-50.530743503, -11.247349656, -5.361076836),
        (-50.530743503, -11.247349656, 5.361076836),
    ]]
    fillet(fillet4_edges, radius=FILLET4_R)

    # Fillet5
    fillet5_edges = [part_1.edges().sort_by_distance(p)[0] for p in [
        (-31.983348043, -27.757349656, -9.525),
        (-15.42998529, -27.757349656, -9.525),
        (-15.42998529, -27.757349656, 9.525),
        (-31.983348043, -27.757349656, 9.525),
    ]]
    fillet(fillet5_edges, radius=FILLET5_R)


solid = part_1.part
